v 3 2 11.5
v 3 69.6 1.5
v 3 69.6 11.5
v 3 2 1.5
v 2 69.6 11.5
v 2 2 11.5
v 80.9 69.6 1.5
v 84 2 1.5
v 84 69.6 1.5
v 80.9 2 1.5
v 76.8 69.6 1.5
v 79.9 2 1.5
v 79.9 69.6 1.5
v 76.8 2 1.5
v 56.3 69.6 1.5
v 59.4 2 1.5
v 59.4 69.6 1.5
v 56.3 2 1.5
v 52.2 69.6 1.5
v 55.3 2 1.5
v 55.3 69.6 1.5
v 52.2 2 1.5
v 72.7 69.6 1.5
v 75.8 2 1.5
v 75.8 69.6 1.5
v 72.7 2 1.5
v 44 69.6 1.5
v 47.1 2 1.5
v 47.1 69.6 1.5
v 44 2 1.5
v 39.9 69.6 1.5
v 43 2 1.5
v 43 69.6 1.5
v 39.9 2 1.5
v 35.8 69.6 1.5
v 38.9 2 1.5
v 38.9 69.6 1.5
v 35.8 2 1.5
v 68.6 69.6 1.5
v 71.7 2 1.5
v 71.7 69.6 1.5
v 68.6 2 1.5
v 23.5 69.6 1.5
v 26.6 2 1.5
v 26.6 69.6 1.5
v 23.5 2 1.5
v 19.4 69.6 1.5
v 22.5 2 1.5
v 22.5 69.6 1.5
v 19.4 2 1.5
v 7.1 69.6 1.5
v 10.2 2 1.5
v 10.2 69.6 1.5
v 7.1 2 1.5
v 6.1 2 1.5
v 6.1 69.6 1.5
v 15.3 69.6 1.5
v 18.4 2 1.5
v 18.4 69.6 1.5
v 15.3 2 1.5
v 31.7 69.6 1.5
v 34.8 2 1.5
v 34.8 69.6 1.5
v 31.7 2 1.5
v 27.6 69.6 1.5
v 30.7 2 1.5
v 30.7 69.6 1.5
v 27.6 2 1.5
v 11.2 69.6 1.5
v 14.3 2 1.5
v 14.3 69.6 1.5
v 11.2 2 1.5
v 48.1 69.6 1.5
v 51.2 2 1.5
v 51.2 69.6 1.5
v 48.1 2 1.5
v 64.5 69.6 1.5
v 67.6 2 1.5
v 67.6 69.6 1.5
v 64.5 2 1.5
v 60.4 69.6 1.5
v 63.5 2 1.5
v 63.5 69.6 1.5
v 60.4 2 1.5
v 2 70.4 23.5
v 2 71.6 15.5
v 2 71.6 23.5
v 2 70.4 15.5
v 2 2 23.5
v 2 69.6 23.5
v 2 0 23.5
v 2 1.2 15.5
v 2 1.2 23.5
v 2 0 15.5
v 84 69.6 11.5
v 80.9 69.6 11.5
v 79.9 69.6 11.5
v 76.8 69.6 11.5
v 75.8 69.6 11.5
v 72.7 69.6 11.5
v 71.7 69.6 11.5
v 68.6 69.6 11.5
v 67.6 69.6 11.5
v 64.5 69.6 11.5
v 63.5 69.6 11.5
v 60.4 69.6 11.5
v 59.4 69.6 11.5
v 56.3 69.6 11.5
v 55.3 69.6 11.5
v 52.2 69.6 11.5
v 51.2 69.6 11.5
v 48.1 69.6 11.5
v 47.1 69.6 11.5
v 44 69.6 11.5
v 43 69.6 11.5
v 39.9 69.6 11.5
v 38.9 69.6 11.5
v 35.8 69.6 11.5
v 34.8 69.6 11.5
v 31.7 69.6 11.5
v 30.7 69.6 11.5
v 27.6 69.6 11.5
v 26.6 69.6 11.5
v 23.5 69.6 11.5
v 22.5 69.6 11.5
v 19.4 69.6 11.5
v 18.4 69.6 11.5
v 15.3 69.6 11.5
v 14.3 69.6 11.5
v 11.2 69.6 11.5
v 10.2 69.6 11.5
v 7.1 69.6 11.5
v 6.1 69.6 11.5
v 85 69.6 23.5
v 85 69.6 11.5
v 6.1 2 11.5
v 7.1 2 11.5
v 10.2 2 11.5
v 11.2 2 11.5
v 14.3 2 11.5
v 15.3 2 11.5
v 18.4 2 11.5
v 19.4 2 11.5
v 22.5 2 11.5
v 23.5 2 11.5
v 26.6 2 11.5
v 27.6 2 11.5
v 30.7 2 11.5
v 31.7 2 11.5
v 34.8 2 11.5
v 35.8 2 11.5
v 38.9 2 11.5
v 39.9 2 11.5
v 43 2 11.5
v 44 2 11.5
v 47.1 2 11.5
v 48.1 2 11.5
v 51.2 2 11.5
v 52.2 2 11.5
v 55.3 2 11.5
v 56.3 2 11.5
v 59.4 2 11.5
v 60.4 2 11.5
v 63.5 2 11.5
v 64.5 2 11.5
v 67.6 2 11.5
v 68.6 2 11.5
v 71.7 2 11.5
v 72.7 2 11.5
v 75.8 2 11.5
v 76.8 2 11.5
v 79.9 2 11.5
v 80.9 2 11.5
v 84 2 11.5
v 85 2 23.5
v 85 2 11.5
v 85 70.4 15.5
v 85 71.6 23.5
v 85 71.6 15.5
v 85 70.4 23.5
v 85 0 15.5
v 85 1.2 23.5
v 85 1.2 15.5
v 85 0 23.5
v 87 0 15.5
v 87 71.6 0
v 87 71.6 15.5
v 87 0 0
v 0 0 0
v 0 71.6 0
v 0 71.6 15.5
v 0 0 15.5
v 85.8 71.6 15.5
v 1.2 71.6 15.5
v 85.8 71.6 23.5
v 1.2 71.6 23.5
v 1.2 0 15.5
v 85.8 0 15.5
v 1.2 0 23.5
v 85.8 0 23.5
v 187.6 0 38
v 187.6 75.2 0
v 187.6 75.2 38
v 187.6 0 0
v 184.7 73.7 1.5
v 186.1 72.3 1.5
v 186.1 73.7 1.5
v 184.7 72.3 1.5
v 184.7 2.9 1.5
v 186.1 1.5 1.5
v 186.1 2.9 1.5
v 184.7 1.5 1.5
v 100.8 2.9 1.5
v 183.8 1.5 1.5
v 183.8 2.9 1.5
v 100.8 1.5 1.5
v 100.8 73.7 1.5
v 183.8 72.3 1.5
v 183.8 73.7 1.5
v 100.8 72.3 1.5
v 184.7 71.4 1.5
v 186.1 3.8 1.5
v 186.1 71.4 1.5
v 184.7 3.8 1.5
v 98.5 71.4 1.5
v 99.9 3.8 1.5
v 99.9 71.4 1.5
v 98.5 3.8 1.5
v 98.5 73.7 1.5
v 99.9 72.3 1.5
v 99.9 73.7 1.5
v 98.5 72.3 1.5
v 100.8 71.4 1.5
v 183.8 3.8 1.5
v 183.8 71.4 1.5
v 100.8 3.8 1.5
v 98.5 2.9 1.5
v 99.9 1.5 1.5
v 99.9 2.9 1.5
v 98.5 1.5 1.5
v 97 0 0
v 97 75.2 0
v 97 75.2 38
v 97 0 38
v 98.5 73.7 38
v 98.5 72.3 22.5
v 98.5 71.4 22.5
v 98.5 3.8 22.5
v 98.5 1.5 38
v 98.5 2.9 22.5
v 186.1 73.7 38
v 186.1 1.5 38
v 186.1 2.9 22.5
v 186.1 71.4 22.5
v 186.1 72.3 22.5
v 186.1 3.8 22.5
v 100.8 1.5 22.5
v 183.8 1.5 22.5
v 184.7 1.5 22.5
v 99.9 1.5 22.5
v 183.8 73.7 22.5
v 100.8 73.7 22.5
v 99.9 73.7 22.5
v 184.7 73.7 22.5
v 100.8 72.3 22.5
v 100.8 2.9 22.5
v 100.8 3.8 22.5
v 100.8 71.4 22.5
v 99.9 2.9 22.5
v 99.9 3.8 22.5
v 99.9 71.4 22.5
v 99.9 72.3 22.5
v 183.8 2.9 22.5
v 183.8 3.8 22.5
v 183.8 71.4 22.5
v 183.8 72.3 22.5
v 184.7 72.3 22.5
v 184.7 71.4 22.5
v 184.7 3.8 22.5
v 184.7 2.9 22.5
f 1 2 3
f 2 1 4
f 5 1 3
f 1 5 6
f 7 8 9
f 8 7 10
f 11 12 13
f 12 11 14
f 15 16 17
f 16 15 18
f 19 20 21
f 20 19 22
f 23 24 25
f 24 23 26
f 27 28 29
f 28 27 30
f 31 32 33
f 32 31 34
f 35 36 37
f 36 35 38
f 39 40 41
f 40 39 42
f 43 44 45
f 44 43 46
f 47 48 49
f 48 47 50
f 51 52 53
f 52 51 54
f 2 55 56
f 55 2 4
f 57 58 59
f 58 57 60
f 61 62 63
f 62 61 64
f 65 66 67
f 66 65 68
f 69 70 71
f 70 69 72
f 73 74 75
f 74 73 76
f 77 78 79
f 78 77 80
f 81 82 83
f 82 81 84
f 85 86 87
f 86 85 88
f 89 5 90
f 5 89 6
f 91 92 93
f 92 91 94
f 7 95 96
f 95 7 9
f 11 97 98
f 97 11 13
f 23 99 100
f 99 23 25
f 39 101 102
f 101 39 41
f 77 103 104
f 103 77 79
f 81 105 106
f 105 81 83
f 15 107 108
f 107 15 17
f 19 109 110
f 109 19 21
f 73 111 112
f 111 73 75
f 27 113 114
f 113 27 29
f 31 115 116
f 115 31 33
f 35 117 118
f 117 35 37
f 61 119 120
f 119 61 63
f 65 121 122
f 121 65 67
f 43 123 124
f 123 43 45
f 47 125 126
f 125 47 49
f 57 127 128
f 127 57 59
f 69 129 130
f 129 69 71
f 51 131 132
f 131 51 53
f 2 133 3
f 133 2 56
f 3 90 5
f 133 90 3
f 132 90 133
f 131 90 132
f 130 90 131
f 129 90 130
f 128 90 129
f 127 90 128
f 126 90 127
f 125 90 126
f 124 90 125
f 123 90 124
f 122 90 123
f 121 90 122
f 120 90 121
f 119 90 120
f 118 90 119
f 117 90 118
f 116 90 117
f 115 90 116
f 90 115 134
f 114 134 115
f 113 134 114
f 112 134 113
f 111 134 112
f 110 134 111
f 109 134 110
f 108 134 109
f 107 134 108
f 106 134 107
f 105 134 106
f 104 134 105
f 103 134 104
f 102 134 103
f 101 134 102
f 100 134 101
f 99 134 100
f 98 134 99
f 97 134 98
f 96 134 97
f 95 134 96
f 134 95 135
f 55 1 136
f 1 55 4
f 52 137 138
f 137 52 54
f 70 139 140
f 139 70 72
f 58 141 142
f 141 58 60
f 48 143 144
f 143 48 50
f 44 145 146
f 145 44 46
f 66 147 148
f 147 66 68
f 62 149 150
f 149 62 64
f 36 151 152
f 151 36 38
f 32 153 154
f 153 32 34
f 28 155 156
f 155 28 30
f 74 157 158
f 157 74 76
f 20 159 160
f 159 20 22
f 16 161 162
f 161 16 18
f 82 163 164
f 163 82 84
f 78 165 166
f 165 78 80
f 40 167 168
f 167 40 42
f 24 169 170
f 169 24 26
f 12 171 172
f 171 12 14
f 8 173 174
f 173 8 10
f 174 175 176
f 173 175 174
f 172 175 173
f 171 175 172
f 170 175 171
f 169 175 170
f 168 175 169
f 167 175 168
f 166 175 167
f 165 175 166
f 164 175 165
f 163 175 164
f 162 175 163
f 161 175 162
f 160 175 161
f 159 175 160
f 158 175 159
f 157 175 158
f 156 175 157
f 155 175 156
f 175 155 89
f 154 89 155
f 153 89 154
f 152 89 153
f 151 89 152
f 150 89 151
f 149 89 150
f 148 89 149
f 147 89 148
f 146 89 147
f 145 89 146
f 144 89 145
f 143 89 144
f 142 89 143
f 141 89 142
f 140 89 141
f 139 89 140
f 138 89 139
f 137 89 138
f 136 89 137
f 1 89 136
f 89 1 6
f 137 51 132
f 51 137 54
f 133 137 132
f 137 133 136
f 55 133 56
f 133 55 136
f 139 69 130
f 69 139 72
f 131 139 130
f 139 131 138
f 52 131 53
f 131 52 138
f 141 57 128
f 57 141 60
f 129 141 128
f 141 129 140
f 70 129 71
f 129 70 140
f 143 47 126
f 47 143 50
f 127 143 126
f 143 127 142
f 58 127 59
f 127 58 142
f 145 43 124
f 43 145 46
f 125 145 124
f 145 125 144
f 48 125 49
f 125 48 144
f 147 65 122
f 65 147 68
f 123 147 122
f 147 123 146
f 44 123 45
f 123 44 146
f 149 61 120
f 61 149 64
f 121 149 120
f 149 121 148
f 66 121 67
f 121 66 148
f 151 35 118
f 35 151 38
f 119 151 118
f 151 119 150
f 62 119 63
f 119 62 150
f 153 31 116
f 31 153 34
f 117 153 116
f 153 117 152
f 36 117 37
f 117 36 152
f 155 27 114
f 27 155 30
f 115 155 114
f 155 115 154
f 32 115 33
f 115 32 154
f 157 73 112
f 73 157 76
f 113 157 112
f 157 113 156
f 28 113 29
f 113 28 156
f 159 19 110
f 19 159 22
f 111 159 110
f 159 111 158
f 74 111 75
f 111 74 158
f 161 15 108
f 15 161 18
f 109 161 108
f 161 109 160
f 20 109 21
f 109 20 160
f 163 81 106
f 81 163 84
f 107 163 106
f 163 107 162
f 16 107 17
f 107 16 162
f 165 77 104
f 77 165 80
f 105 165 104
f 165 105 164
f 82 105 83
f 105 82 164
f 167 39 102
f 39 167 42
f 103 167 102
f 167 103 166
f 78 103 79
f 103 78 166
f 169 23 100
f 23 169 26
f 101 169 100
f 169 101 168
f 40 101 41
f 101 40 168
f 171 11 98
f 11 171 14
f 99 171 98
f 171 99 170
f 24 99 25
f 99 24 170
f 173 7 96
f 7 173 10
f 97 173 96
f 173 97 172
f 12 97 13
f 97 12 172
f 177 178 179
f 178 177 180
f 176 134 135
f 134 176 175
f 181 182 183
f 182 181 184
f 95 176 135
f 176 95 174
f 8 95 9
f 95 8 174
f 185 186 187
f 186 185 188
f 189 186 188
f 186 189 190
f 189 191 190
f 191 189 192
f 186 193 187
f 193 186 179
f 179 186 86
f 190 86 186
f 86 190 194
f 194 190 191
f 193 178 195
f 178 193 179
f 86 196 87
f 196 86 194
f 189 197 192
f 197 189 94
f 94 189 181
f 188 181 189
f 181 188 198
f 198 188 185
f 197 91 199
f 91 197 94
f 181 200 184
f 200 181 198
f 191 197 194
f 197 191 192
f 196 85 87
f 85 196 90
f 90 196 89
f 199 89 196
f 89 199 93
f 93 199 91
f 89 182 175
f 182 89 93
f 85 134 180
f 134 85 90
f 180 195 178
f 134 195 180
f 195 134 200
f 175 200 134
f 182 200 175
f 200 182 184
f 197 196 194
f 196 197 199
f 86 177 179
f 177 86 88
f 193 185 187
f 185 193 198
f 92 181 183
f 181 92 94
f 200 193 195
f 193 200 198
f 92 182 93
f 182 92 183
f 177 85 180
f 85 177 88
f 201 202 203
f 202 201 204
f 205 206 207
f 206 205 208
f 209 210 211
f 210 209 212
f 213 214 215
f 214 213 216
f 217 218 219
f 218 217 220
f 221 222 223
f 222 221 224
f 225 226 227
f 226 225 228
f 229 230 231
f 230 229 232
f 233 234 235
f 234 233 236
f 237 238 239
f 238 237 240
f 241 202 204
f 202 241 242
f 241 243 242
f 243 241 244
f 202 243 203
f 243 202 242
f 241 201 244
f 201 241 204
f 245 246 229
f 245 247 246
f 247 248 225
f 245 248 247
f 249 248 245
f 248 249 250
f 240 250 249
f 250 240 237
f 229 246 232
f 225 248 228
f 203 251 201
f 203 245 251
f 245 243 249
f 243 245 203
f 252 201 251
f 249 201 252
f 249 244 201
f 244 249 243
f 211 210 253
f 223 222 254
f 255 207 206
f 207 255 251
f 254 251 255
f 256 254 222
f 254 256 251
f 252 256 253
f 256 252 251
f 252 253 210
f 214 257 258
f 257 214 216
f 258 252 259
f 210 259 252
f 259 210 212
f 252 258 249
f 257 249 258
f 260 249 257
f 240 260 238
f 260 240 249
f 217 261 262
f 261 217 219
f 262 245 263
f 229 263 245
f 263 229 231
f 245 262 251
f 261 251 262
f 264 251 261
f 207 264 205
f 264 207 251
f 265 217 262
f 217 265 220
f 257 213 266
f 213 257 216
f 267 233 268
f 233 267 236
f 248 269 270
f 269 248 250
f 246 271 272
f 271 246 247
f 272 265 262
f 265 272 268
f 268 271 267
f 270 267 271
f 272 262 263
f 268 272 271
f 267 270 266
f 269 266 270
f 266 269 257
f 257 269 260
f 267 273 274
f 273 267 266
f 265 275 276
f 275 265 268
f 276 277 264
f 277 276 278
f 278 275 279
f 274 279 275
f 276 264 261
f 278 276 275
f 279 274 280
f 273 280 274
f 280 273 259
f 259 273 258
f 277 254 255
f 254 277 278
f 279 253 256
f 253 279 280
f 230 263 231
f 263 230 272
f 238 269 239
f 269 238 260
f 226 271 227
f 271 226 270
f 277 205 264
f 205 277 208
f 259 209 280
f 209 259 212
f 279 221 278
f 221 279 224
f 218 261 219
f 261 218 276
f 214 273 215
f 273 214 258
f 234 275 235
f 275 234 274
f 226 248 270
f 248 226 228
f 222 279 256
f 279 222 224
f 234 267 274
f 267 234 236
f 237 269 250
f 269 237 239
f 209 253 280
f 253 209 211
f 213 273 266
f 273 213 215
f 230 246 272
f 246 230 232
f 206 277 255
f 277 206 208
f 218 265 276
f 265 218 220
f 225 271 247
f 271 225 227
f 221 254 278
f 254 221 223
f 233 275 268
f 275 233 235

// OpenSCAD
// =========================================================================
// Gradient Color Swatch Card Storage Box — OpenSCAD
// 梯度色卡收纳盒（合盖式 · 深帽盖）
//
// Stepped-rim snap-on deep-cap lid.
// Box walls step inward near the top; lid outer walls extend
// from plate down to near box base; inner lip catches the ledge.
// No overhangs, no supports needed.
//
// 盒壁顶部内缩形成台阶，盖子外壁从顶板延伸到盒底附近，
// 内唇卡住台阶扣合。无悬垂，无需支撑。
// =========================================================================

// --- Card dimensions / 色卡尺寸 (实测) ---
card_w       = 67.0;   // 色卡长边 (mm)
card_h       = 34.0;   // 色卡短边 / 竖放高度 (mm)
card_t       = 2.88;   // 色卡厚度 (mm, 实测值)

// --- Box parameters / 盒体参数 ---
num_cards    = 20;      // 每盒色卡数量
wall         = 2.0;     // 厚壁段壁厚 (mm)
floor_t      = 1.5;     // 底板厚度 (mm)
groove_t     = 1.0;     // 凹槽隔条厚度 (mm)
groove_h     = 10.0;    // 凹槽隔条高度 (mm)
expose       = 12.0;    // 色卡露出盒口的高度 (mm)
step_inset   = 1.2;     // 台阶内缩量：厚壁→薄壁缩进多少 (mm)
step_depth   = 8.0;     // 台阶区高度：薄壁段有多高 (mm)

// --- Tolerances / 公差 (FDM 优化) ---
// slot_clearance:  0.22 mm → 每侧 0.11 mm (槽宽 3.1 mm)
// width_clearance: 0.60 mm → 每侧 0.30 mm
// lid_clearance:   0.30 mm (紧扣但可拆)
slot_clearance  = 0.22;  // 厚度方向总间隙 (mm)
width_clearance = 0.60;  // 宽度方向总间隙 (mm)
lid_clearance   = 0.30;  // 盖子与盒壁间隙 (mm)

// --- Lid parameters / 盖子参数 ---
plate        = 1.5;     // 盖子顶板厚度 (mm)
lid_wall     = 1.5;     // 盖子外壁厚度 (mm)
top_clearance = 2.0;    // 盖内顶面与色卡顶部的间隙 (mm)

// =========================================================================
// Derived dimensions — do not edit
// =========================================================================

slot  = card_t + slot_clearance;
ix    = num_cards * slot + (num_cards + 1) * groove_t;
iy    = card_w + width_clearance;

wall_h = card_h - expose;
thin   = wall - step_inset;

ox = ix + 2 * wall;
oy = iy + 2 * wall;
oz = wall_h + floor_t;
step_z = oz - step_depth;

// Lid derived
card_top_z     = floor_t + card_h;
plate_inner_z  = card_top_z + top_clearance;
gap            = lid_clearance;

lx      = ox + 2 * gap + 2 * lid_wall;
ly      = oy + 2 * gap + 2 * lid_wall;
outer_h = plate_inner_z - 1.0;
lip_h   = plate_inner_z - step_z - 1.0;
lip_t   = step_inset - gap;
lip_off = lid_wall + gap + thin + gap;

// =========================================================================
// Box body module
// =========================================================================

module box_body() {
    // Floor
    cube([ox, oy, floor_t]);

    // --- Left wall: thick then thin ---
    translate([0, 0, floor_t])
        cube([wall, oy, step_z - floor_t]);
    translate([step_inset, 0, step_z])
        cube([thin, oy, oz - step_z]);

    // --- Right wall ---
    translate([ox - wall, 0, floor_t])
        cube([wall, oy, step_z - floor_t]);
    translate([ox - step_inset - thin, 0, step_z])
        cube([thin, oy, oz - step_z]);

    // --- Front wall ---
    translate([wall, 0, floor_t])
        cube([ox - 2 * wall, wall, step_z - floor_t]);
    translate([wall, step_inset, step_z])
        cube([ox - 2 * wall, thin, oz - step_z]);

    // --- Back wall ---
    translate([wall, oy - wall, floor_t])
        cube([ox - 2 * wall, wall, step_z - floor_t]);
    translate([wall, oy - step_inset - thin, step_z])
        cube([ox - 2 * wall, thin, oz - step_z]);

    // --- Groove ridges ---
    for (i = [0 : num_cards]) {
        gx = wall + i * (slot + groove_t);
        translate([gx, wall, floor_t])
            cube([groove_t, oy - 2 * wall, groove_h]);
    }
}

// =========================================================================
// Lid module  (modeled in print orientation: plate on bed)
// =========================================================================

module lid() {
    w = lid_wall;

    // Plate
    cube([lx, ly, plate]);

    // --- Outer walls (4 sides) ---
    // Left
    translate([0, 0, plate])
        cube([w, ly, outer_h]);
    // Right
    translate([lx - w, 0, plate])
        cube([w, ly, outer_h]);
    // Front
    translate([w, 0, plate])
        cube([lx - 2 * w, w, outer_h]);
    // Back
    translate([w, ly - w, plate])
        cube([lx - 2 * w, w, outer_h]);

    // --- Inner lip (4 sides) ---
    // Left lip
    translate([lip_off, w, plate])
        cube([lip_t, ly - 2 * w, lip_h]);
    // Right lip
    translate([lx - lip_off - lip_t, w, plate])
        cube([lip_t, ly - 2 * w, lip_h]);
    // Front lip
    translate([w, lip_off, plate])
        cube([lx - 2 * w, lip_t, lip_h]);
    // Back lip
    translate([w, ly - lip_off - lip_t, plate])
        cube([lx - 2 * w, lip_t, lip_h]);
}

// =========================================================================
// Render — box and lid side by side
// =========================================================================

// Box body (left)
box_body();

// Lid (right, separated by 10 mm gap)
translate([ox + 10, 0, 0])
    lid();

// =========================================================================
// Summary (shown in console with echo)
// =========================================================================
echo(str(
    "\n=== Snap-On Lid Gradient-Card Box ===",
    "\n  Card: ", card_w, " x ", card_h, " x ", card_t, " mm",
    "\n  Slots: ", num_cards,
    "\n  Box:  ", ox, " x ", oy, " x ", oz, " mm",
    "\n    Wall: ", wall_h, " mm tall, card exposed: ", expose, " mm",
    "\n    Step: ", step_inset, " mm inset, ", step_depth, " mm deep",
    "\n  Lid:  ", lx, " x ", ly, " x ", plate + outer_h, " mm",
    "\n    Outer walls: ", outer_h, " mm, inner lip: ", lip_t, " x ", lip_h, " mm",
    "\n  Groove: ", groove_t, " x ", groove_h, " mm",
    "\n  Tolerances:",
    "\n    Slot: ", slot_clearance, " mm total (", slot_clearance/2, " mm/side)",
    "\n    Width: ", width_clearance, " mm total (", width_clearance/2, " mm/side)",
    "\n    Lid gap: ", lid_clearance, " mm",
    "\n  Print: box upright, lid upside-down (plate on bed). No supports."
));
